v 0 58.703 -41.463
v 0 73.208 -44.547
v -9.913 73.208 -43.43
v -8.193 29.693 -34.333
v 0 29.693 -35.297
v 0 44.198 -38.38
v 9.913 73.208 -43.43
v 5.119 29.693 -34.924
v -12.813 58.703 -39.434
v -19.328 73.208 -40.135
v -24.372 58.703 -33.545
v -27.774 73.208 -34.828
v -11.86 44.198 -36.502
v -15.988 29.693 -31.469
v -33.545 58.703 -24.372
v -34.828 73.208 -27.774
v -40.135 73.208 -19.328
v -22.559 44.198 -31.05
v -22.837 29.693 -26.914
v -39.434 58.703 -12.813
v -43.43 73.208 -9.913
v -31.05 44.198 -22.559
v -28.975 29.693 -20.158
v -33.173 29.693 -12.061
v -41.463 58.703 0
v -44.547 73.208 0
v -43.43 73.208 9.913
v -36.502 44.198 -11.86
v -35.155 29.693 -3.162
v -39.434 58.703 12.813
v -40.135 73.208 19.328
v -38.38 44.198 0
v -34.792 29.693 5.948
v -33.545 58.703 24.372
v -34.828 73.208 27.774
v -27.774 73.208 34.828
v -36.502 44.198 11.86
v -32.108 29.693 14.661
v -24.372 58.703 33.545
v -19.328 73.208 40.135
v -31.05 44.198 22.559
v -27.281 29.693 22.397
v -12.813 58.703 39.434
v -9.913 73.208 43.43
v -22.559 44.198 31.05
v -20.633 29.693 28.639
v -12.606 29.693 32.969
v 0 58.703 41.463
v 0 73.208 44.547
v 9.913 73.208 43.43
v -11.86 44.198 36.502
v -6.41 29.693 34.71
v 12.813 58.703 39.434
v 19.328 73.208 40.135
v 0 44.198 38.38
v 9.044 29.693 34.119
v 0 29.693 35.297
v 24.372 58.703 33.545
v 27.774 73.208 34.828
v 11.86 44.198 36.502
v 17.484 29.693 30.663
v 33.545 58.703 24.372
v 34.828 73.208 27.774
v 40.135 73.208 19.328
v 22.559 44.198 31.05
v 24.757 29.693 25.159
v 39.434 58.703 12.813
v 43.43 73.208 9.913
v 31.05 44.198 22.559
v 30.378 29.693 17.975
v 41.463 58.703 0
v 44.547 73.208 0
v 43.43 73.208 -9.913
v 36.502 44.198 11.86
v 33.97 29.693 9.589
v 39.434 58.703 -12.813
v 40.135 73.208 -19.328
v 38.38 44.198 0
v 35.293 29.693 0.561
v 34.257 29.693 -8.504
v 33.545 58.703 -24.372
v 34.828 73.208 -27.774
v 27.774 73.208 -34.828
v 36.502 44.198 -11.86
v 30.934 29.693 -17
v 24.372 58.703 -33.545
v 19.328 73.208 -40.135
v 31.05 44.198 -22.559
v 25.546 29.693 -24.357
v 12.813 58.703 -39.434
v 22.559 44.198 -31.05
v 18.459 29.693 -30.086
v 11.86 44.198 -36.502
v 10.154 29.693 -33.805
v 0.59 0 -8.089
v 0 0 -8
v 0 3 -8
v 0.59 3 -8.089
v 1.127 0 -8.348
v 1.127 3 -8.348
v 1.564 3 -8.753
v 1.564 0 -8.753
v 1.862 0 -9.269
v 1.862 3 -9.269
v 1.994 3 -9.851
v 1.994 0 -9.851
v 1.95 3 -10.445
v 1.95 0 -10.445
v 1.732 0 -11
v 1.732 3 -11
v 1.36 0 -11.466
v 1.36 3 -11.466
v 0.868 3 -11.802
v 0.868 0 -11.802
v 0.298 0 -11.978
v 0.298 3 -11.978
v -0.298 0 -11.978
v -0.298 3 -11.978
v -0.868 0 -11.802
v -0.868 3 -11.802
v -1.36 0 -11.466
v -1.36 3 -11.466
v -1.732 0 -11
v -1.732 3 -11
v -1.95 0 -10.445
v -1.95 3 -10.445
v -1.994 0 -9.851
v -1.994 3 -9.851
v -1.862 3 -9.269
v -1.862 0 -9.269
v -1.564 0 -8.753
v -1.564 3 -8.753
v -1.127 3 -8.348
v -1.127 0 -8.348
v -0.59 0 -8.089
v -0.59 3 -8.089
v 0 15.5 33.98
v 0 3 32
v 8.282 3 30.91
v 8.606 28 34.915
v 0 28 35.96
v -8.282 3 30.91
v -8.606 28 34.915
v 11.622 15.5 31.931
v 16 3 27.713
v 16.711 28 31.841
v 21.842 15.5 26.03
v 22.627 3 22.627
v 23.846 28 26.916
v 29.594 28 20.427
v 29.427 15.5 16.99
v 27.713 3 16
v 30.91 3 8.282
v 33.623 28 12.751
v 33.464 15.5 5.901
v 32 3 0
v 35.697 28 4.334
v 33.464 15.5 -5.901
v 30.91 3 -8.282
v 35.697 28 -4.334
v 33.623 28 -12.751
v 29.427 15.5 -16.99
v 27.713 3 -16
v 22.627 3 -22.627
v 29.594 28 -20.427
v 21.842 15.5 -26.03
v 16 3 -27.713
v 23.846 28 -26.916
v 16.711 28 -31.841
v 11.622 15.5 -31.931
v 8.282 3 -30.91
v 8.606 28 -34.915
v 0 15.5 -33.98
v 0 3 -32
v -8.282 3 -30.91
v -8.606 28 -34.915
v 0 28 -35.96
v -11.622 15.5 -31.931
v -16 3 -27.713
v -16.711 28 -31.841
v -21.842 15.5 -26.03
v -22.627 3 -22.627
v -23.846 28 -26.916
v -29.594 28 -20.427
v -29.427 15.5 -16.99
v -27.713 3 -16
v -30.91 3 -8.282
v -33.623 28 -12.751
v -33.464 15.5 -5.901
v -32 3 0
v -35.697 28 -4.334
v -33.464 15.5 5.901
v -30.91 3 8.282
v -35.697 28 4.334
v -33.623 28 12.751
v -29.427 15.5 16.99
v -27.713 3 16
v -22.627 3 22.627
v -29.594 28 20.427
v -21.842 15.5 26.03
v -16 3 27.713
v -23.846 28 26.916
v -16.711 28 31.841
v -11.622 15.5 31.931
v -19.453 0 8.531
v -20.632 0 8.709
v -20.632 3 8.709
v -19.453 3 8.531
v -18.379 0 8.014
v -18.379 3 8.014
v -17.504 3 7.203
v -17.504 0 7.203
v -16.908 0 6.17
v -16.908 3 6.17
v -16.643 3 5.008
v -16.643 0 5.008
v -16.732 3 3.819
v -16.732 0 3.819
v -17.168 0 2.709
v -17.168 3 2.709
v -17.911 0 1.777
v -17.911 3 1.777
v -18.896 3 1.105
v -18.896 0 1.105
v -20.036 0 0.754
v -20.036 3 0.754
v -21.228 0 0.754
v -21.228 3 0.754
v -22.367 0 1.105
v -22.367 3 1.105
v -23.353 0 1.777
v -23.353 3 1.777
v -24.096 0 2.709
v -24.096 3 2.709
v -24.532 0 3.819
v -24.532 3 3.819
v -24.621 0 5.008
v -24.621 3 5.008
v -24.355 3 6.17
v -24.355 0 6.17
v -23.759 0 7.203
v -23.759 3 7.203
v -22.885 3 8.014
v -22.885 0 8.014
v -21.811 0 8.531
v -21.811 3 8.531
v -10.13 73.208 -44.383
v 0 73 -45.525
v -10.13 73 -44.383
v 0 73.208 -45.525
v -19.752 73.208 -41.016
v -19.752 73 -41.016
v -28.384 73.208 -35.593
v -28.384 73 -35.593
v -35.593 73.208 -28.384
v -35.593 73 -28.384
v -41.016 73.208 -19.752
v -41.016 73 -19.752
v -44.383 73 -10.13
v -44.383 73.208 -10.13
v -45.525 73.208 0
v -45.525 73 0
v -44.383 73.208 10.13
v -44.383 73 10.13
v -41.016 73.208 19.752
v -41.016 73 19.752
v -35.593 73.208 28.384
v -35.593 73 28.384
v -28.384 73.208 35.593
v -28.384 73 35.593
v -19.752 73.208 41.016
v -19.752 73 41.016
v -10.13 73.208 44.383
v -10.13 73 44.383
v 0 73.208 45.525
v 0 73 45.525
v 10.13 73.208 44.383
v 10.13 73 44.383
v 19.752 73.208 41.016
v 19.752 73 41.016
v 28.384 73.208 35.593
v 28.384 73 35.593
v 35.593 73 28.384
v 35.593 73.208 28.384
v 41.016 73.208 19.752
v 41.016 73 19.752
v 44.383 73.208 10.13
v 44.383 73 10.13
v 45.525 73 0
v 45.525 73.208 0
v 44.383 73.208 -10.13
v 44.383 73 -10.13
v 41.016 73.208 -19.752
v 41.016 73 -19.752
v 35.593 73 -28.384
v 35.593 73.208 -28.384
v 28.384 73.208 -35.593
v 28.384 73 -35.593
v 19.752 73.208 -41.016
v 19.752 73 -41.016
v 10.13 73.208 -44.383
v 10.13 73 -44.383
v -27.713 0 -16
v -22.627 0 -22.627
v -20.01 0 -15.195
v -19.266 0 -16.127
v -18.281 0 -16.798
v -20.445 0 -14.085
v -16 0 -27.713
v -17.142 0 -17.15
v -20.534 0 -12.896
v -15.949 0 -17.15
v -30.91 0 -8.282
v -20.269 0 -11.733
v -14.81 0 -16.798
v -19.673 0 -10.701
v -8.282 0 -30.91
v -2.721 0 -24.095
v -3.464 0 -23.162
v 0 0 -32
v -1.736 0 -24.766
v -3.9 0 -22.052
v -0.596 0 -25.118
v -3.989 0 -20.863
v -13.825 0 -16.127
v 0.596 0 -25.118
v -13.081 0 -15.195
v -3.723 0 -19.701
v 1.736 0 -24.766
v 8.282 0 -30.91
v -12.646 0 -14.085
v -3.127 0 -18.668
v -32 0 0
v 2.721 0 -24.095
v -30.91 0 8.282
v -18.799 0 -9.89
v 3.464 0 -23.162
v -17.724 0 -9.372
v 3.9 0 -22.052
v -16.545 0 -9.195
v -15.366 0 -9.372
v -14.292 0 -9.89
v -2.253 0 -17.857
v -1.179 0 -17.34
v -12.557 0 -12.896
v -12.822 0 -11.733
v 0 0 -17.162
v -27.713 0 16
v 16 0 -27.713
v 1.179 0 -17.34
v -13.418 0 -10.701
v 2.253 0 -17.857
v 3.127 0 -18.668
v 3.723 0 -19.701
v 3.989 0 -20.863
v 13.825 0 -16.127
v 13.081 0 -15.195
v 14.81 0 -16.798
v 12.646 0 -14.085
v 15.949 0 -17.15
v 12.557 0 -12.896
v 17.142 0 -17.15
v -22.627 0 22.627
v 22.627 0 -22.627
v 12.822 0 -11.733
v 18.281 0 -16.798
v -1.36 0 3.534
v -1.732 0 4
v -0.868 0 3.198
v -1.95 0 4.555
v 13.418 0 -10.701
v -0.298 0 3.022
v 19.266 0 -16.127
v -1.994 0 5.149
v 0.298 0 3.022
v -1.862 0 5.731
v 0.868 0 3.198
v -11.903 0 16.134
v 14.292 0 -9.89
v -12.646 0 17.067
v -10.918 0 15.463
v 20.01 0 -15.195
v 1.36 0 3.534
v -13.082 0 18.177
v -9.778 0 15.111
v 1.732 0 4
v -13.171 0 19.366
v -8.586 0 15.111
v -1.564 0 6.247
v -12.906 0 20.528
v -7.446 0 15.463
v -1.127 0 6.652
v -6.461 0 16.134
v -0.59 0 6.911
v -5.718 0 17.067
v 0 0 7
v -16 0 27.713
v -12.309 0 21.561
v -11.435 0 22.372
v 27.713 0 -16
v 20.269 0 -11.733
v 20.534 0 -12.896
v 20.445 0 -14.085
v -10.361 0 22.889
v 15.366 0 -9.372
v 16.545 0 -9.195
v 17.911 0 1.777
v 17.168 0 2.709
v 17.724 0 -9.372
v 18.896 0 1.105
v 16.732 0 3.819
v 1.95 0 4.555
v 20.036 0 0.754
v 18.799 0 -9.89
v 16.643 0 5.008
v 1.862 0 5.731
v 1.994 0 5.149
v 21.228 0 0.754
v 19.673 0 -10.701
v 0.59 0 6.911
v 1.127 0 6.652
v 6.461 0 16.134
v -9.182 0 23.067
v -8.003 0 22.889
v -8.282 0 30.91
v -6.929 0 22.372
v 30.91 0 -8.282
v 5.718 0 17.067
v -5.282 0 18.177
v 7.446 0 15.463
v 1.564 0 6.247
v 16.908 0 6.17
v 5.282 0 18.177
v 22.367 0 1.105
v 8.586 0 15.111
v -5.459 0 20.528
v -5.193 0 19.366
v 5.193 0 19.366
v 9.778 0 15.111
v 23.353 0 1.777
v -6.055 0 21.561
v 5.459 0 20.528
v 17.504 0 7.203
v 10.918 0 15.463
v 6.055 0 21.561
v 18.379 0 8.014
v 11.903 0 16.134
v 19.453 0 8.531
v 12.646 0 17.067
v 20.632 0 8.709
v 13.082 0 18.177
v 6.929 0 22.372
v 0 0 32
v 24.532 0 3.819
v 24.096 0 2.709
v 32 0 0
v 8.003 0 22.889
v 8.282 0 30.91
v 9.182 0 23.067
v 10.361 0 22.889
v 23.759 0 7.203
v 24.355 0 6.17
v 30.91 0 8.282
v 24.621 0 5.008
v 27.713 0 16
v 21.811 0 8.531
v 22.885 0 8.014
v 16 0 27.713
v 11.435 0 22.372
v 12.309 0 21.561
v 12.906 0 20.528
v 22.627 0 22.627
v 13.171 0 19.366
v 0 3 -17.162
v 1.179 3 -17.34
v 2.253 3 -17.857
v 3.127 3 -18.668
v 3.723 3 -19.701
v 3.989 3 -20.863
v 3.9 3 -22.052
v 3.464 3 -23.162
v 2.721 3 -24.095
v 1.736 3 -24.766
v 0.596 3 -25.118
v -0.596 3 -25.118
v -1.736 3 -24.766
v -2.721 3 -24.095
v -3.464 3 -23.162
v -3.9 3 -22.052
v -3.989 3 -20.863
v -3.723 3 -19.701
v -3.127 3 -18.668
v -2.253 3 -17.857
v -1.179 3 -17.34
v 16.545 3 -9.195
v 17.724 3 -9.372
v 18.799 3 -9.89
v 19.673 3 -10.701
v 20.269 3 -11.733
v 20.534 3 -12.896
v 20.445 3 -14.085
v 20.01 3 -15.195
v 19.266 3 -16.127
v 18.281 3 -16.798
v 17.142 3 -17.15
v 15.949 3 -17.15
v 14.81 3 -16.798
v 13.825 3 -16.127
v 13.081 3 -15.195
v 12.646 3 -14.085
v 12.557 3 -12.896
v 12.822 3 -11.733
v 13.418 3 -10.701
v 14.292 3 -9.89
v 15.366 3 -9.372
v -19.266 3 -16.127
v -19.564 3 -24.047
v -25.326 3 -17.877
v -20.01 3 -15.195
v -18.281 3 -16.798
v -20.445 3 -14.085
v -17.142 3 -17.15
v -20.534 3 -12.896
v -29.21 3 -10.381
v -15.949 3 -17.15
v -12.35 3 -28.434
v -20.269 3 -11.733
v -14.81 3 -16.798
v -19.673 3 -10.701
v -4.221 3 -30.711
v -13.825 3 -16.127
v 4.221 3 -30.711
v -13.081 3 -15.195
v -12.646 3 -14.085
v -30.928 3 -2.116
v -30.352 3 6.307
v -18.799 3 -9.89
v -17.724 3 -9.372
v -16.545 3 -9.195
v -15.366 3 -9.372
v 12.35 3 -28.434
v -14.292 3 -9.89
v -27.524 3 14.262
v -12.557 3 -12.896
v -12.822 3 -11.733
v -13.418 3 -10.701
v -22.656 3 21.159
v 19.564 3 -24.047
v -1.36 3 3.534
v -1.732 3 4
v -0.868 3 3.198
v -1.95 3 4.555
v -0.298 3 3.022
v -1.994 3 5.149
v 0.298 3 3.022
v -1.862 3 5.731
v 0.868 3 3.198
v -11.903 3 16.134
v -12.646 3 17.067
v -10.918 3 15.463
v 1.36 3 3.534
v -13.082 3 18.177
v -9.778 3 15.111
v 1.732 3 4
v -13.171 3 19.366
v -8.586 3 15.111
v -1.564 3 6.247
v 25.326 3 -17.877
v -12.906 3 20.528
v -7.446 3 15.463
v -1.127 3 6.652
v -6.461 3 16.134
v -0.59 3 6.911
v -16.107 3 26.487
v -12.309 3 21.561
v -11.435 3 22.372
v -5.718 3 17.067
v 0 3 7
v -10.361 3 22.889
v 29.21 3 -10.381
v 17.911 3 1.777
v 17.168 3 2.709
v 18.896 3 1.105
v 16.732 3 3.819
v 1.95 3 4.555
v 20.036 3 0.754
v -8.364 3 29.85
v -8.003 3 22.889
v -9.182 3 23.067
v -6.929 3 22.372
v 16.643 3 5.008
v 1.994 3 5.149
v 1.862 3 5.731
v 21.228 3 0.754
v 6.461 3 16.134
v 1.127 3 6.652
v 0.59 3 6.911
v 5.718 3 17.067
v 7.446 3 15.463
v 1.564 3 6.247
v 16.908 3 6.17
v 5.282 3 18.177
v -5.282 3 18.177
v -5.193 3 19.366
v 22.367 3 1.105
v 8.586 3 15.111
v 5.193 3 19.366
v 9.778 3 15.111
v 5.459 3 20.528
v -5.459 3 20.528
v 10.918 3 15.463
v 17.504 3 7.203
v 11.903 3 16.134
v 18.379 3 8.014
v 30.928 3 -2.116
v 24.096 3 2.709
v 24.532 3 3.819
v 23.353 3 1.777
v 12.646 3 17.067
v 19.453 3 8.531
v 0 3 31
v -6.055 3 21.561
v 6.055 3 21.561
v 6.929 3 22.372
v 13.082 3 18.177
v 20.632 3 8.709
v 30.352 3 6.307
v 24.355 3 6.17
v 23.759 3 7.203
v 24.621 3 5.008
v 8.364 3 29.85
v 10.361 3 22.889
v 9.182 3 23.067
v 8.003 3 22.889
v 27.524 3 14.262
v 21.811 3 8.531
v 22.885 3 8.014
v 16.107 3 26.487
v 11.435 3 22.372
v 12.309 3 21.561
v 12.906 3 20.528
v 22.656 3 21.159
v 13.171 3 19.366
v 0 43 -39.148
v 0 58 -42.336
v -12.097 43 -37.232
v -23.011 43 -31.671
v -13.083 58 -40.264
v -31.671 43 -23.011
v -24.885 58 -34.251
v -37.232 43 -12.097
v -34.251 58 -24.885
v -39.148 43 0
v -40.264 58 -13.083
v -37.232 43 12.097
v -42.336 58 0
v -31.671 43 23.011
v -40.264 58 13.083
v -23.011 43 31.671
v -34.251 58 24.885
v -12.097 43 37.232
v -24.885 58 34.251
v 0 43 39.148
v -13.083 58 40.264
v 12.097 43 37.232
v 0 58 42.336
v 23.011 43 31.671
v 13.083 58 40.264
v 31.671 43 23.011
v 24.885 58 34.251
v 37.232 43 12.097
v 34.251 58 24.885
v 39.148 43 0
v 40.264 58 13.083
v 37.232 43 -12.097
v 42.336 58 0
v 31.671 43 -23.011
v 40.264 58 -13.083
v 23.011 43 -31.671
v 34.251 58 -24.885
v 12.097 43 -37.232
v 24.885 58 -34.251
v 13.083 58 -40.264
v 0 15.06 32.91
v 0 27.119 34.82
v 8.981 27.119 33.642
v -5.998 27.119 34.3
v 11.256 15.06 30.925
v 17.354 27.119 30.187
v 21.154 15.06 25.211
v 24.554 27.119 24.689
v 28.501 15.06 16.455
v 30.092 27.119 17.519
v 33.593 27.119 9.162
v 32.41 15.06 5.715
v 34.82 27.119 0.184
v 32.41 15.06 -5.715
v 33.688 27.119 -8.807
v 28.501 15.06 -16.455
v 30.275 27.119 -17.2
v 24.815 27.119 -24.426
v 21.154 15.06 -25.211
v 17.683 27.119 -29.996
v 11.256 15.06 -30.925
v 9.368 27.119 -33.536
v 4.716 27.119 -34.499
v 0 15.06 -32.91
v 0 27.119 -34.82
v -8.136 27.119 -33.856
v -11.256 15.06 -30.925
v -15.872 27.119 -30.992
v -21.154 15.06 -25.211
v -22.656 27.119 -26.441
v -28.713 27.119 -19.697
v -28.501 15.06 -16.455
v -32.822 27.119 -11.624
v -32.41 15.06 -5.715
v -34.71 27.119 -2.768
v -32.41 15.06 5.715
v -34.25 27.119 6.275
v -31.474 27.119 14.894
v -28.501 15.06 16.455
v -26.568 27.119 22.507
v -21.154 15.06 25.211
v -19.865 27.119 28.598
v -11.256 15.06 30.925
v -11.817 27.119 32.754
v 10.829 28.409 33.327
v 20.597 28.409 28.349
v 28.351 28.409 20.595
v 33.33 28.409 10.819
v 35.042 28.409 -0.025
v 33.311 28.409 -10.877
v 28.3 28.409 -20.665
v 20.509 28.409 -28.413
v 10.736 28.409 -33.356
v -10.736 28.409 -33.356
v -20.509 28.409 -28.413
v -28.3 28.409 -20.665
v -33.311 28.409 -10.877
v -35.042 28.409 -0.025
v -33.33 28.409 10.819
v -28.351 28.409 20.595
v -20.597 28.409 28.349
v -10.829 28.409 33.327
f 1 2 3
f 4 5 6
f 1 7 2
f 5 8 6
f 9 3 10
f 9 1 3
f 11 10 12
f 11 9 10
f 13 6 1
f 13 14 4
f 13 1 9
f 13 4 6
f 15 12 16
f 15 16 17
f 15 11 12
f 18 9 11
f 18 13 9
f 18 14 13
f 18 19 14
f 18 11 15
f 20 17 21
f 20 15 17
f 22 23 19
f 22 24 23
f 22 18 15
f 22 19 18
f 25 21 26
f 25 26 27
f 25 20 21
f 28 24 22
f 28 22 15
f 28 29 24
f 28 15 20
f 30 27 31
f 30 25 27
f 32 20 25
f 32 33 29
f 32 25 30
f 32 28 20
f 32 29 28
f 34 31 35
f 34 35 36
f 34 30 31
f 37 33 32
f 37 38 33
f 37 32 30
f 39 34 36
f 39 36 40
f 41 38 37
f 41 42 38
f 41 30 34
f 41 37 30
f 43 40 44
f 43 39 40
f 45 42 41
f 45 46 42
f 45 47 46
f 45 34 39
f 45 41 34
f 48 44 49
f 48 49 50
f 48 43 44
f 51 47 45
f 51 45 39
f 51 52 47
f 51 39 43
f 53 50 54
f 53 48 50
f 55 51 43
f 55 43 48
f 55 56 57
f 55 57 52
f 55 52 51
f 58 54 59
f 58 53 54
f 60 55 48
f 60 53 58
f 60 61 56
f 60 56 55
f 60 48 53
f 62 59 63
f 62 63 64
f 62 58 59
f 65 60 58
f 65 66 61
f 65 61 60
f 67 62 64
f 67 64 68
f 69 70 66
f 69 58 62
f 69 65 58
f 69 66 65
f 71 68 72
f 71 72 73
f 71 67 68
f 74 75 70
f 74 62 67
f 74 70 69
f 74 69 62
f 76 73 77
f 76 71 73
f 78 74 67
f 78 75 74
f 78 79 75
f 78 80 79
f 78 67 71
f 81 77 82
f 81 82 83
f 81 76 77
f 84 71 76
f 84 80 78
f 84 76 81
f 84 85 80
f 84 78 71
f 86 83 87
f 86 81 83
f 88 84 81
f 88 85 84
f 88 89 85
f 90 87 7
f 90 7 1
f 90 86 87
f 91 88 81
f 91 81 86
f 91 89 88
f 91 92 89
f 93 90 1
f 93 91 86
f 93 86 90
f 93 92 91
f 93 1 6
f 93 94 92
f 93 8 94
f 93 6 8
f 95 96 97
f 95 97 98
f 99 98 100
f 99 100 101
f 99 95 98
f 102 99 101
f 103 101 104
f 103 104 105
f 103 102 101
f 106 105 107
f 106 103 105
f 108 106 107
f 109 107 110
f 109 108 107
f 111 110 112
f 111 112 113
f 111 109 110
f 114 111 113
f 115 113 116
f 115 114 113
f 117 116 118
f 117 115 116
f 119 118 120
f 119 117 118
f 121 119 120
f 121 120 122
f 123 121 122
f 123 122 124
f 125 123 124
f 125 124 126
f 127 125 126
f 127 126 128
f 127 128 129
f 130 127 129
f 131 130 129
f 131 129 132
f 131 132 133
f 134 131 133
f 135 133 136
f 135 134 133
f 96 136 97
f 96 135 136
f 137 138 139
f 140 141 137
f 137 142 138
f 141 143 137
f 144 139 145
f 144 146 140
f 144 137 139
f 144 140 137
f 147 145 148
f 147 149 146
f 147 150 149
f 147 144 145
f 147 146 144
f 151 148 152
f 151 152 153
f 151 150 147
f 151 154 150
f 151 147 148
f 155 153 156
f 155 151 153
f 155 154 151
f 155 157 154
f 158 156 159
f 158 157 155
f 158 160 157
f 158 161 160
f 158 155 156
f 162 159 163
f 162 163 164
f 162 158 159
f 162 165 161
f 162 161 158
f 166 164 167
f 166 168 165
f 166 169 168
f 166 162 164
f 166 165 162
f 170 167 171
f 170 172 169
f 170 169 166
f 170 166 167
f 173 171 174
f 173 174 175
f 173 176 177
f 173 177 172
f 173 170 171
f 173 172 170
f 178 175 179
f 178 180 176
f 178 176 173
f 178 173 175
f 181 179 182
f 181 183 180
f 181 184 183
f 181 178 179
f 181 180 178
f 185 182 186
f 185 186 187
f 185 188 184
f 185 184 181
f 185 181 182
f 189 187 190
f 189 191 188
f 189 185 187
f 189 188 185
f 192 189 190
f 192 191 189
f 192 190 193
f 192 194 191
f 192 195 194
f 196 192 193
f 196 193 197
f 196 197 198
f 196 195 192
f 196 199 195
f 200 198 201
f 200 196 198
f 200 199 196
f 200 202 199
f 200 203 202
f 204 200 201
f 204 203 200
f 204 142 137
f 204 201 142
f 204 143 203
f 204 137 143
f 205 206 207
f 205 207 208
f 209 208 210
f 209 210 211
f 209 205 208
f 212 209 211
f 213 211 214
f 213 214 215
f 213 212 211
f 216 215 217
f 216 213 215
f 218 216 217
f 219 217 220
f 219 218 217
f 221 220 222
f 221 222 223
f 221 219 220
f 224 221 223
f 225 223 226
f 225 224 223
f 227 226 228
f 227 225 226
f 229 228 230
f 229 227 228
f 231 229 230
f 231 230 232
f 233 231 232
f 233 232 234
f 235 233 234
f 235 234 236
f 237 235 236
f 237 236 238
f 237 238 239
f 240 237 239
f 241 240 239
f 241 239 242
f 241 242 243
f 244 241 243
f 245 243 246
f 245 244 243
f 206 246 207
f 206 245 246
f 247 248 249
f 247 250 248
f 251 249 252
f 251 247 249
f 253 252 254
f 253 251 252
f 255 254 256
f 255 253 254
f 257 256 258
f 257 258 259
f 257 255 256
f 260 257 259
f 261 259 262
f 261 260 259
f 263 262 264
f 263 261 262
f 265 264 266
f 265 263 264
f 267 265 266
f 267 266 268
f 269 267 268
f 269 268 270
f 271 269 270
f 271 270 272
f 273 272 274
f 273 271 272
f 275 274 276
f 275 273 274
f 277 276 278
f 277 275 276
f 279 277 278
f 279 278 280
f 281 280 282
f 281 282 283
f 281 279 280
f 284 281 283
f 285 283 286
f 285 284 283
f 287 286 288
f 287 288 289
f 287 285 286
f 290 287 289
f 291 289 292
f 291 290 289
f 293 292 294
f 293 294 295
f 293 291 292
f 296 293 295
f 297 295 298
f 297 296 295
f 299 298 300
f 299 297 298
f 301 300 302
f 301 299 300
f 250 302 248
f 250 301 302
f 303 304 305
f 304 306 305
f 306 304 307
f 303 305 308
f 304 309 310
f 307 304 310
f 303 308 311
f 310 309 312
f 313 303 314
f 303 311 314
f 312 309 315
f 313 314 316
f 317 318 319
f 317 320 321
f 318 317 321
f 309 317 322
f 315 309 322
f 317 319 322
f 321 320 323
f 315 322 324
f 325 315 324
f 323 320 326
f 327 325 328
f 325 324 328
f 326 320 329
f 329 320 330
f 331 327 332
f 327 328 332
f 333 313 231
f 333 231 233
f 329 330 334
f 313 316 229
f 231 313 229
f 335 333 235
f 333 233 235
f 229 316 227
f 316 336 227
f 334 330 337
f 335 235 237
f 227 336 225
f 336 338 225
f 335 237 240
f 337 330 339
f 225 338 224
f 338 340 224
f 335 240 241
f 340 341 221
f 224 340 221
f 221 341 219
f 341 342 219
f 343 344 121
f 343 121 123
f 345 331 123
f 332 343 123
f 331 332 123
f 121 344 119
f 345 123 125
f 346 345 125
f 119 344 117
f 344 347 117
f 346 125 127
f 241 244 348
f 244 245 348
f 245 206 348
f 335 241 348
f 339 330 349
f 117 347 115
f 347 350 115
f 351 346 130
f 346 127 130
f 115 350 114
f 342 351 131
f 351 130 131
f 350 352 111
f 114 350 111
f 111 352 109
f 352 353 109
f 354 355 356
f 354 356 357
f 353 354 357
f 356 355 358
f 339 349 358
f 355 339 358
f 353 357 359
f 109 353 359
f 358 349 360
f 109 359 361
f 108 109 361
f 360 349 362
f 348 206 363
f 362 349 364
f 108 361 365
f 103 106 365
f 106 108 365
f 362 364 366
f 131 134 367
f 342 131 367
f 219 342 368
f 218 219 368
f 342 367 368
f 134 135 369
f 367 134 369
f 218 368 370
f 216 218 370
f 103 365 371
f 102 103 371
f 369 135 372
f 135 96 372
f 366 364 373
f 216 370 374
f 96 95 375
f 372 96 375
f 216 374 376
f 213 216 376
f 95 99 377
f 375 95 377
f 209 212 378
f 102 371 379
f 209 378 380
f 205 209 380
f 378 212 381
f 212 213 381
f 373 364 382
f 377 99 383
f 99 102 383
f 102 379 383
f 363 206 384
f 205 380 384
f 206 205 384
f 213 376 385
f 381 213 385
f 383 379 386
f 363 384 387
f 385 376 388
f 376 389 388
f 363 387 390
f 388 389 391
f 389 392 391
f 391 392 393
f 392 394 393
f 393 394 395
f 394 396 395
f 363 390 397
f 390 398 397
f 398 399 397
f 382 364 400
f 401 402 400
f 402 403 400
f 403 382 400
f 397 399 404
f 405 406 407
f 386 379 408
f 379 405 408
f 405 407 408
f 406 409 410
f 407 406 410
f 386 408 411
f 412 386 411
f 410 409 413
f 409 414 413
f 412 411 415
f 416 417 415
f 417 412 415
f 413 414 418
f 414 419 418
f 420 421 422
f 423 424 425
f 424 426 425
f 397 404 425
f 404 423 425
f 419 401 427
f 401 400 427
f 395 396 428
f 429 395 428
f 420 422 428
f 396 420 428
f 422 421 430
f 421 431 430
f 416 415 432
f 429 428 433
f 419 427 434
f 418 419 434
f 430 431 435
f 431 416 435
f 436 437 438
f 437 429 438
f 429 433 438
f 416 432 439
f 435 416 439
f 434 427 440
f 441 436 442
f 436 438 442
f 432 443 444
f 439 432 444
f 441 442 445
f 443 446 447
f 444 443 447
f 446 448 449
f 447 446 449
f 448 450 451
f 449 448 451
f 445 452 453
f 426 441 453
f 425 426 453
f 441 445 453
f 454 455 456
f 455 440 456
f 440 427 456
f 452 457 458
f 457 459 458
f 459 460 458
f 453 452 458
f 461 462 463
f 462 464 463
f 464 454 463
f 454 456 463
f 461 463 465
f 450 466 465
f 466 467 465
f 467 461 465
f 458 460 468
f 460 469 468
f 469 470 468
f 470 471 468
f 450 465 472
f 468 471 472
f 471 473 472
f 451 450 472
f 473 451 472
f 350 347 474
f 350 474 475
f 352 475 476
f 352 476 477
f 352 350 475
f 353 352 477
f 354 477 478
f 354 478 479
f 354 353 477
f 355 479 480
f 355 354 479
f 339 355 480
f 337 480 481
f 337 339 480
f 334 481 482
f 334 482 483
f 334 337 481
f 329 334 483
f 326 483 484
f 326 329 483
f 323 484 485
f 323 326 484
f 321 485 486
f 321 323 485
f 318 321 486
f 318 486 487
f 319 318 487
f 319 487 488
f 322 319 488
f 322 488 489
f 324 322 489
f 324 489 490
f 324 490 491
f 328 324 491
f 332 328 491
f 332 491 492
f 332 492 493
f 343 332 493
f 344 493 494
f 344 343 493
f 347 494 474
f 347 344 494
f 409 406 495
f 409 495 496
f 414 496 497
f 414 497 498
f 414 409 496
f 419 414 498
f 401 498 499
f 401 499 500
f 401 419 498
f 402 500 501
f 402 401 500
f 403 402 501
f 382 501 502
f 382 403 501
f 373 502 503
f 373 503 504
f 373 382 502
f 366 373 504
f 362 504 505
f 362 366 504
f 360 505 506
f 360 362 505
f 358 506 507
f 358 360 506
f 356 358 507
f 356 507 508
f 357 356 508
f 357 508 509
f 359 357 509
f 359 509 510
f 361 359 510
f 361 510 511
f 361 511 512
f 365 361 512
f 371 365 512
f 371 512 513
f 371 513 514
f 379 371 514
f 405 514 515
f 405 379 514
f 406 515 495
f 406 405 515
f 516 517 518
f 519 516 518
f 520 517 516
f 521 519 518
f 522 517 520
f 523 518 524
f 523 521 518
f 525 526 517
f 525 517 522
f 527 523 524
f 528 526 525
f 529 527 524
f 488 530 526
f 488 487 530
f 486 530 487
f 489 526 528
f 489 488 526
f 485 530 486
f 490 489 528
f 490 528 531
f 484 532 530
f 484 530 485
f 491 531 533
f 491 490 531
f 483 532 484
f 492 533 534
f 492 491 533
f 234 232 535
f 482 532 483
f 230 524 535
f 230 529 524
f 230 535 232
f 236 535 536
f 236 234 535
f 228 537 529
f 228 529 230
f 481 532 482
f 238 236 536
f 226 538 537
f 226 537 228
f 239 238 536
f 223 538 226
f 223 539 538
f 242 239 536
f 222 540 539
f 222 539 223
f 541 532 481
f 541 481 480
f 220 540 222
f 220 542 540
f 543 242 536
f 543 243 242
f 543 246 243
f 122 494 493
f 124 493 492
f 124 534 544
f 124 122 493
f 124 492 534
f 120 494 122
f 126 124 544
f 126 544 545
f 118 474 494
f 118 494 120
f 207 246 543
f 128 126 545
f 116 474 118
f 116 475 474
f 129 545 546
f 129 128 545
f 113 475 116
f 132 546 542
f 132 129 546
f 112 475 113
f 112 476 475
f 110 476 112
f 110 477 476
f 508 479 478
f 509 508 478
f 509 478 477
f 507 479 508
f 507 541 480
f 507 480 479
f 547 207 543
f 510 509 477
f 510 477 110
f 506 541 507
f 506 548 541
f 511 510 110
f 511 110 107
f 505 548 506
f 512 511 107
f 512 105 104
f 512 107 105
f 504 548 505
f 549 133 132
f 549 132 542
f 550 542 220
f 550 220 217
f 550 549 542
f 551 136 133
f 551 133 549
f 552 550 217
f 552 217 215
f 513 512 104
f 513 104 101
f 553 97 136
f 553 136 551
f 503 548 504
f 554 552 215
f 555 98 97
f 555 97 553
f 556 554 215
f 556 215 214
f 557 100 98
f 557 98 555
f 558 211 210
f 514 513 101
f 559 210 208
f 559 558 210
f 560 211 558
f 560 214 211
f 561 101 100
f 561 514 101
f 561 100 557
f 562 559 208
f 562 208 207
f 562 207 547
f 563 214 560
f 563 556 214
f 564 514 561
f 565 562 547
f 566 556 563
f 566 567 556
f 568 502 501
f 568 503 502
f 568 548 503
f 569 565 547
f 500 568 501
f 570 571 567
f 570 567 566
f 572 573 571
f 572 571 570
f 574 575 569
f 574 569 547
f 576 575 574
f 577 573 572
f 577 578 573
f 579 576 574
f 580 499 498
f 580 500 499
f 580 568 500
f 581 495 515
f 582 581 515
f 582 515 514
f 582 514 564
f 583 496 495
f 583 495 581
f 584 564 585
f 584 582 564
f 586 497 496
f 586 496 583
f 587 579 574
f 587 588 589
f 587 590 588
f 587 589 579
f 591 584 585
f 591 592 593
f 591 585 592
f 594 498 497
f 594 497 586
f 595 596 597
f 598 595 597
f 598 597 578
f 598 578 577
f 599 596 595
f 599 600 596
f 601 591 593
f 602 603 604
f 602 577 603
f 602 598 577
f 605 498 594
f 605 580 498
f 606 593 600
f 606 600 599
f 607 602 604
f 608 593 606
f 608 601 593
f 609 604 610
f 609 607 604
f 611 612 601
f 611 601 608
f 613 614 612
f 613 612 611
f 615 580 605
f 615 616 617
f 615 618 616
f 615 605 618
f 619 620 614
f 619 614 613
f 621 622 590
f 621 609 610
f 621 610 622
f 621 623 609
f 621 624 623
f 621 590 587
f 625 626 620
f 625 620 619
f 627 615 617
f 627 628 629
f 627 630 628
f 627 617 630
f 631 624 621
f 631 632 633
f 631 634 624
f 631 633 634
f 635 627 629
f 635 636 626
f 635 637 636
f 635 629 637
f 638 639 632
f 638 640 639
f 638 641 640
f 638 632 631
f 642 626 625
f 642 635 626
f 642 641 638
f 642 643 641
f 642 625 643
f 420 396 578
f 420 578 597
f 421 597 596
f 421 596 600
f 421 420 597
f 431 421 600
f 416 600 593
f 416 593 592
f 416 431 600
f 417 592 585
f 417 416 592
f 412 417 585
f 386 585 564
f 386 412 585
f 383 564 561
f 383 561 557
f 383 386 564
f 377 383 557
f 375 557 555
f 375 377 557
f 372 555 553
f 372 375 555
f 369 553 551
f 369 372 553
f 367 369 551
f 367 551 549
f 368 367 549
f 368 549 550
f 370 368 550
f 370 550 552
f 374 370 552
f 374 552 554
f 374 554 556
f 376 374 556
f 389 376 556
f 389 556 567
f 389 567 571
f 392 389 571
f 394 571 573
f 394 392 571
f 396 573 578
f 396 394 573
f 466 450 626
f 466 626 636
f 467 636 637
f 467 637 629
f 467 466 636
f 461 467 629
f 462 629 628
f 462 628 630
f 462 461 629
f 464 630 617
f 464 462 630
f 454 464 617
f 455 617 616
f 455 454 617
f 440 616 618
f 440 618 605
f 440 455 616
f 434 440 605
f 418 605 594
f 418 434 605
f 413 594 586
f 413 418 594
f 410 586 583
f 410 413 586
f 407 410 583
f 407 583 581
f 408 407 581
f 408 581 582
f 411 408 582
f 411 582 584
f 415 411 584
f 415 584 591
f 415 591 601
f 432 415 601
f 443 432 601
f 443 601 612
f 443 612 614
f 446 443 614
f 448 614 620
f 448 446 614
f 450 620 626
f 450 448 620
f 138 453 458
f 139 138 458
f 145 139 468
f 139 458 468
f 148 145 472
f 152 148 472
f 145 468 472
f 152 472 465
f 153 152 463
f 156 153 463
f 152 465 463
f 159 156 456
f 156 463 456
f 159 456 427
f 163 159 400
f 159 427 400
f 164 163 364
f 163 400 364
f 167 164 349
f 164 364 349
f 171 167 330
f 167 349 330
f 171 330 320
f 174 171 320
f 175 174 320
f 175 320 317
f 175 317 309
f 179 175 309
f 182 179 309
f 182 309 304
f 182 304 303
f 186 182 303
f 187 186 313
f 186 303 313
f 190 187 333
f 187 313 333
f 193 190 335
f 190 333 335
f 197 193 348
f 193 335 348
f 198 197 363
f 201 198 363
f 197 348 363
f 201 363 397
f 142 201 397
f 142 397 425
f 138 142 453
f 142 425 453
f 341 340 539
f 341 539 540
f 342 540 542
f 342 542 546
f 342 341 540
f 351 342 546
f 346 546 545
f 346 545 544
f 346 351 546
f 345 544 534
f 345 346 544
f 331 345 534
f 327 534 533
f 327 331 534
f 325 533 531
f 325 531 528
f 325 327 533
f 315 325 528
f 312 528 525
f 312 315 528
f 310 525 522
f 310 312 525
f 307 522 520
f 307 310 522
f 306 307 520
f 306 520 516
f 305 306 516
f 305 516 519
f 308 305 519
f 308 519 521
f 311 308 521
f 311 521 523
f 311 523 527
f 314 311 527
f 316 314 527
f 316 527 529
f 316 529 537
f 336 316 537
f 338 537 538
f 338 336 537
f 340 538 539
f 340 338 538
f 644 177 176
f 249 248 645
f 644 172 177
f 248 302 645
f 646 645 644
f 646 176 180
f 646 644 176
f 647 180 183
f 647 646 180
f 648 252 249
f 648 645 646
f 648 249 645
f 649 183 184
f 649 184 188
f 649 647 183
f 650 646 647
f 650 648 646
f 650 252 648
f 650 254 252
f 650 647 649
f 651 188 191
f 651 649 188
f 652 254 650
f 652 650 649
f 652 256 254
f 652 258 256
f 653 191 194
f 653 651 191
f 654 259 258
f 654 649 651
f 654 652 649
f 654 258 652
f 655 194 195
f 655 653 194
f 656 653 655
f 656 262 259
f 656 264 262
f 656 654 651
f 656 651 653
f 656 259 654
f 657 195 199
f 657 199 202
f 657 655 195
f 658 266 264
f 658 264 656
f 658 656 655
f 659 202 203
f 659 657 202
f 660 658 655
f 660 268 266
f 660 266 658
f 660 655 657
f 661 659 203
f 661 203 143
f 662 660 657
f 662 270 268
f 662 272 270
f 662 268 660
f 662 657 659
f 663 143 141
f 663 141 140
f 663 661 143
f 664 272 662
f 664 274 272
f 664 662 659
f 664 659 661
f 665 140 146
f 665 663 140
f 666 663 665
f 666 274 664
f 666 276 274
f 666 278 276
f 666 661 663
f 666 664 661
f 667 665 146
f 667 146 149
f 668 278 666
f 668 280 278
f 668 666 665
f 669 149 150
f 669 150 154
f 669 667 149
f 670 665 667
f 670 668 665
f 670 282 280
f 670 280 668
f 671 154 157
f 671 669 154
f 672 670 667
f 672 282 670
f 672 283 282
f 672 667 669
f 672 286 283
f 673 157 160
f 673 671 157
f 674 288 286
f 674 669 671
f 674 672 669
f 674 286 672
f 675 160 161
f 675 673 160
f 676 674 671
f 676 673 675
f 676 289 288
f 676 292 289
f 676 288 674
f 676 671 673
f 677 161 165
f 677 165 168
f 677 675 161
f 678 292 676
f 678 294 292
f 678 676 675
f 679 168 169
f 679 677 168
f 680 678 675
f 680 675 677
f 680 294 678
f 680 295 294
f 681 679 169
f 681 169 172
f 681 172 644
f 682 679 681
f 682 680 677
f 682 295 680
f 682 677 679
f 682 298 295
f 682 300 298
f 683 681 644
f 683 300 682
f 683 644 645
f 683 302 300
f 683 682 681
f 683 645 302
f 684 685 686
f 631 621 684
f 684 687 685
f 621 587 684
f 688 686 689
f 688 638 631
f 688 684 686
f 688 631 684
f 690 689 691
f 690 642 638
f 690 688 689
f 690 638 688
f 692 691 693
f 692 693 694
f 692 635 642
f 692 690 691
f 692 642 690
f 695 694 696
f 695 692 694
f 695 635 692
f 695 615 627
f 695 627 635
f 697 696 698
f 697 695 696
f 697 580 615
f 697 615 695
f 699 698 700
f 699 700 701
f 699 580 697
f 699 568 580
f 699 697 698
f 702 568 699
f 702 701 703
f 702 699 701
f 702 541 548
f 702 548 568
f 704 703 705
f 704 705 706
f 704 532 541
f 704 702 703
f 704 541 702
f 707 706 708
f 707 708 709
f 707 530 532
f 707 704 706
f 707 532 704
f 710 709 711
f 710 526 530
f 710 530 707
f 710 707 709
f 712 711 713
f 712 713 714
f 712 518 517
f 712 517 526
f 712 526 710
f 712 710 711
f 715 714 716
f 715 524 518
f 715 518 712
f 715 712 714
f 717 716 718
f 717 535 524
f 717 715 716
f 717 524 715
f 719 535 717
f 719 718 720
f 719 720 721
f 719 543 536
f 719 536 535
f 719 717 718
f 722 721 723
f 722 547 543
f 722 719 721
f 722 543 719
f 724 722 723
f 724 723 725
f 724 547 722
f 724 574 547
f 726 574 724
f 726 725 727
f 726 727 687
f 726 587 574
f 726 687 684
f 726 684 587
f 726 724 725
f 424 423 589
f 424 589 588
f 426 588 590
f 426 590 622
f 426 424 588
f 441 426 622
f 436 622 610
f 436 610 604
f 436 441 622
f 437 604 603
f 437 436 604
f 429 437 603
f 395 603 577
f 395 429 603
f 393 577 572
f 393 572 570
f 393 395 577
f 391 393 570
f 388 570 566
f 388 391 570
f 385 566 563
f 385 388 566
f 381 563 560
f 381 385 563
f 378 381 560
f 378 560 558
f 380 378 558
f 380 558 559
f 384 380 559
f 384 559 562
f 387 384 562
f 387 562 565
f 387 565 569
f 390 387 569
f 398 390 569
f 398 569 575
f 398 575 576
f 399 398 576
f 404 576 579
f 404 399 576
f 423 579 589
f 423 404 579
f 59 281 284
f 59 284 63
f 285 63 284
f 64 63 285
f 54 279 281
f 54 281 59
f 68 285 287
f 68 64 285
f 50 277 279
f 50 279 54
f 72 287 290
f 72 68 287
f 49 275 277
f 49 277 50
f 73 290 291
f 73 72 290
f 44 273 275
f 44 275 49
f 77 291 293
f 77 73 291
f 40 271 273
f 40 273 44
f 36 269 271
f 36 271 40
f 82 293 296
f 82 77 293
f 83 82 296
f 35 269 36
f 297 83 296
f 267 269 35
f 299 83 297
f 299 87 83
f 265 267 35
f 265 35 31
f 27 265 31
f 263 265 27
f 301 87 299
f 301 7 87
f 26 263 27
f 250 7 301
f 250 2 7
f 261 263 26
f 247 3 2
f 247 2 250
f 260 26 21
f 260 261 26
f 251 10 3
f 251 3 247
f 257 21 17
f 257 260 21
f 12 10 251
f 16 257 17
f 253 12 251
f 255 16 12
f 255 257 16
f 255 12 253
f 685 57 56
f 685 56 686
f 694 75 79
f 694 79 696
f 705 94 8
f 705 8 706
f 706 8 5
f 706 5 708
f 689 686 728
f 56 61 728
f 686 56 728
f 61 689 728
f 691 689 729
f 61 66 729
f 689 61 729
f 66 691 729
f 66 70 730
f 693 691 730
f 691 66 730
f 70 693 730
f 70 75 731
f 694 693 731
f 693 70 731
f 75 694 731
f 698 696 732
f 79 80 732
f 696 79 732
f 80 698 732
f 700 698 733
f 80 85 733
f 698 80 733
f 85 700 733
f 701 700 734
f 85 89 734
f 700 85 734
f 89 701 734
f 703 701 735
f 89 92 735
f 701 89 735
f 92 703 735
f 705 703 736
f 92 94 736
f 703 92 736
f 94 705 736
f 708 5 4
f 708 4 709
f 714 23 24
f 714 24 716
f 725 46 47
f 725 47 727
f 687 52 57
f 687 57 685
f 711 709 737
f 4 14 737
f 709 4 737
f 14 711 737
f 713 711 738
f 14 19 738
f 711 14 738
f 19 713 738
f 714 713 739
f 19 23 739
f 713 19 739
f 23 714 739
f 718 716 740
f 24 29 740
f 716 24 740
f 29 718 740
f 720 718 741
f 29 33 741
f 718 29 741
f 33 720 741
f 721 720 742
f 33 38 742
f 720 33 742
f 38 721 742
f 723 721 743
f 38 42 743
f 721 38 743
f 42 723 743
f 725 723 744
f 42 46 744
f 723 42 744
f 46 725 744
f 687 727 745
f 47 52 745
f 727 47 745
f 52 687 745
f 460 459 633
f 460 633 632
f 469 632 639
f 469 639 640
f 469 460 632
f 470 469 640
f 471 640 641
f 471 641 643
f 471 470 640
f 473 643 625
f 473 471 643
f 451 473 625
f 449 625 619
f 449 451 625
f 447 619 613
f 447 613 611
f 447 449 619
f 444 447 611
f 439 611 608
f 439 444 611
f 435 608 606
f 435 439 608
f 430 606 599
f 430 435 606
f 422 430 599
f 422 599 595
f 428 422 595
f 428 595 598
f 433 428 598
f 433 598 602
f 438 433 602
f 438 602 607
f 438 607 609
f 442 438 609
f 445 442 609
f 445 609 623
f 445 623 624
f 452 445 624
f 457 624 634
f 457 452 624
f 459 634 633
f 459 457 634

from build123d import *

# Parameters (mm, degrees)
SKETCH1_R           = 32
SKETCH1_R_2         = 2
SKETCH1_R_3         = 4
BOSS_EXTRUDE1_DEPTH = 3
FILLET1_R           = 50


with BuildPart() as part:
    # Sketch1 → Boss-Extrude1 (new body)
    with BuildSketch(Plane(origin=(0, 0, 0), x_dir=(1, 0, 0), z_dir=(0, 1, 0))):
        with Locations(Location((0, 0, 0), (0, 0, 270))):
            Circle(SKETCH1_R)
        with Locations(Location((0, 10, 0), (0, 0, 270))):
            Circle(SKETCH1_R_2, mode=Mode.SUBTRACT)
        with Locations(Location((0, -5, 0), (0, 0, 270))):
            Circle(SKETCH1_R_2, mode=Mode.SUBTRACT)
        with Locations(Location((0, 21.162401824, 0), (0, 0, 270))):
            Circle(SKETCH1_R_3, mode=Mode.SUBTRACT)
        with Locations(Location((16.54543199, 13.19454172, 0), (0, 0, 270))):
            Circle(SKETCH1_R_3, mode=Mode.SUBTRACT)
        with Locations(Location((20.631816227, -4.709077419, 0), (0, 0, 270))):
            Circle(SKETCH1_R_3, mode=Mode.SUBTRACT)
        with Locations(Location((9.182022032, -19.066665213, 0), (0, 0, 270))):
            Circle(SKETCH1_R_3, mode=Mode.SUBTRACT)
        with Locations(Location((-9.182022032, -19.066665213, 0), (0, 0, 270))):
            Circle(SKETCH1_R_3, mode=Mode.SUBTRACT)
        with Locations(Location((-20.631816227, -4.709077419, 0), (0, 0, 270))):
            Circle(SKETCH1_R_3, mode=Mode.SUBTRACT)
        with Locations(Location((-16.54543199, 13.19454172, 0), (0, 0, 270))):
            Circle(SKETCH1_R_3, mode=Mode.SUBTRACT)
    extrude(amount=BOSS_EXTRUDE1_DEPTH)

    # Sketch3 → Revolve2 (revolve)
    with BuildSketch(Plane(origin=(0, 0, 0), x_dir=(0, 0, -1), z_dir=(1, 0, 0))):
        Polygon((-32, 3), (-35.959611008, 28), (-34.959611008, 28), (-30.524846679, 0), (-32, 0), align=None)
    revolve(axis=Axis((0, 0, 0), (0, 1, 0)))

    # Sketch5 → Revolve3 (revolve)
    with BuildSketch(Plane(origin=(0, 0, 0), x_dir=(0, 0, -1), z_dir=(1, 0, 0)), mode=Mode.PRIVATE) as revolve3_sk:
        Polygon((-35.959611008, 28), (-45.524656283, 73), (-45.524656283, 73.207911691), (-44.546508683, 73.207911691), (-34.981463407, 28.207911691), (-34.959611008, 28), align=None)
    revolve(revolve3_sk.sketch.rotate(Axis((0, 0, 0), (0, 1, 0)), 180), axis=Axis((0, 0, 0), (0, 1, 0)))

    # Fillet1
    fillet1_edges = [part.edges().sort_by_distance(p)[0] for p in [
        (0, 28.207911691, 34.981463407),
    ]]
    fillet(fillet1_edges, radius=FILLET1_R)


solid = part.part
